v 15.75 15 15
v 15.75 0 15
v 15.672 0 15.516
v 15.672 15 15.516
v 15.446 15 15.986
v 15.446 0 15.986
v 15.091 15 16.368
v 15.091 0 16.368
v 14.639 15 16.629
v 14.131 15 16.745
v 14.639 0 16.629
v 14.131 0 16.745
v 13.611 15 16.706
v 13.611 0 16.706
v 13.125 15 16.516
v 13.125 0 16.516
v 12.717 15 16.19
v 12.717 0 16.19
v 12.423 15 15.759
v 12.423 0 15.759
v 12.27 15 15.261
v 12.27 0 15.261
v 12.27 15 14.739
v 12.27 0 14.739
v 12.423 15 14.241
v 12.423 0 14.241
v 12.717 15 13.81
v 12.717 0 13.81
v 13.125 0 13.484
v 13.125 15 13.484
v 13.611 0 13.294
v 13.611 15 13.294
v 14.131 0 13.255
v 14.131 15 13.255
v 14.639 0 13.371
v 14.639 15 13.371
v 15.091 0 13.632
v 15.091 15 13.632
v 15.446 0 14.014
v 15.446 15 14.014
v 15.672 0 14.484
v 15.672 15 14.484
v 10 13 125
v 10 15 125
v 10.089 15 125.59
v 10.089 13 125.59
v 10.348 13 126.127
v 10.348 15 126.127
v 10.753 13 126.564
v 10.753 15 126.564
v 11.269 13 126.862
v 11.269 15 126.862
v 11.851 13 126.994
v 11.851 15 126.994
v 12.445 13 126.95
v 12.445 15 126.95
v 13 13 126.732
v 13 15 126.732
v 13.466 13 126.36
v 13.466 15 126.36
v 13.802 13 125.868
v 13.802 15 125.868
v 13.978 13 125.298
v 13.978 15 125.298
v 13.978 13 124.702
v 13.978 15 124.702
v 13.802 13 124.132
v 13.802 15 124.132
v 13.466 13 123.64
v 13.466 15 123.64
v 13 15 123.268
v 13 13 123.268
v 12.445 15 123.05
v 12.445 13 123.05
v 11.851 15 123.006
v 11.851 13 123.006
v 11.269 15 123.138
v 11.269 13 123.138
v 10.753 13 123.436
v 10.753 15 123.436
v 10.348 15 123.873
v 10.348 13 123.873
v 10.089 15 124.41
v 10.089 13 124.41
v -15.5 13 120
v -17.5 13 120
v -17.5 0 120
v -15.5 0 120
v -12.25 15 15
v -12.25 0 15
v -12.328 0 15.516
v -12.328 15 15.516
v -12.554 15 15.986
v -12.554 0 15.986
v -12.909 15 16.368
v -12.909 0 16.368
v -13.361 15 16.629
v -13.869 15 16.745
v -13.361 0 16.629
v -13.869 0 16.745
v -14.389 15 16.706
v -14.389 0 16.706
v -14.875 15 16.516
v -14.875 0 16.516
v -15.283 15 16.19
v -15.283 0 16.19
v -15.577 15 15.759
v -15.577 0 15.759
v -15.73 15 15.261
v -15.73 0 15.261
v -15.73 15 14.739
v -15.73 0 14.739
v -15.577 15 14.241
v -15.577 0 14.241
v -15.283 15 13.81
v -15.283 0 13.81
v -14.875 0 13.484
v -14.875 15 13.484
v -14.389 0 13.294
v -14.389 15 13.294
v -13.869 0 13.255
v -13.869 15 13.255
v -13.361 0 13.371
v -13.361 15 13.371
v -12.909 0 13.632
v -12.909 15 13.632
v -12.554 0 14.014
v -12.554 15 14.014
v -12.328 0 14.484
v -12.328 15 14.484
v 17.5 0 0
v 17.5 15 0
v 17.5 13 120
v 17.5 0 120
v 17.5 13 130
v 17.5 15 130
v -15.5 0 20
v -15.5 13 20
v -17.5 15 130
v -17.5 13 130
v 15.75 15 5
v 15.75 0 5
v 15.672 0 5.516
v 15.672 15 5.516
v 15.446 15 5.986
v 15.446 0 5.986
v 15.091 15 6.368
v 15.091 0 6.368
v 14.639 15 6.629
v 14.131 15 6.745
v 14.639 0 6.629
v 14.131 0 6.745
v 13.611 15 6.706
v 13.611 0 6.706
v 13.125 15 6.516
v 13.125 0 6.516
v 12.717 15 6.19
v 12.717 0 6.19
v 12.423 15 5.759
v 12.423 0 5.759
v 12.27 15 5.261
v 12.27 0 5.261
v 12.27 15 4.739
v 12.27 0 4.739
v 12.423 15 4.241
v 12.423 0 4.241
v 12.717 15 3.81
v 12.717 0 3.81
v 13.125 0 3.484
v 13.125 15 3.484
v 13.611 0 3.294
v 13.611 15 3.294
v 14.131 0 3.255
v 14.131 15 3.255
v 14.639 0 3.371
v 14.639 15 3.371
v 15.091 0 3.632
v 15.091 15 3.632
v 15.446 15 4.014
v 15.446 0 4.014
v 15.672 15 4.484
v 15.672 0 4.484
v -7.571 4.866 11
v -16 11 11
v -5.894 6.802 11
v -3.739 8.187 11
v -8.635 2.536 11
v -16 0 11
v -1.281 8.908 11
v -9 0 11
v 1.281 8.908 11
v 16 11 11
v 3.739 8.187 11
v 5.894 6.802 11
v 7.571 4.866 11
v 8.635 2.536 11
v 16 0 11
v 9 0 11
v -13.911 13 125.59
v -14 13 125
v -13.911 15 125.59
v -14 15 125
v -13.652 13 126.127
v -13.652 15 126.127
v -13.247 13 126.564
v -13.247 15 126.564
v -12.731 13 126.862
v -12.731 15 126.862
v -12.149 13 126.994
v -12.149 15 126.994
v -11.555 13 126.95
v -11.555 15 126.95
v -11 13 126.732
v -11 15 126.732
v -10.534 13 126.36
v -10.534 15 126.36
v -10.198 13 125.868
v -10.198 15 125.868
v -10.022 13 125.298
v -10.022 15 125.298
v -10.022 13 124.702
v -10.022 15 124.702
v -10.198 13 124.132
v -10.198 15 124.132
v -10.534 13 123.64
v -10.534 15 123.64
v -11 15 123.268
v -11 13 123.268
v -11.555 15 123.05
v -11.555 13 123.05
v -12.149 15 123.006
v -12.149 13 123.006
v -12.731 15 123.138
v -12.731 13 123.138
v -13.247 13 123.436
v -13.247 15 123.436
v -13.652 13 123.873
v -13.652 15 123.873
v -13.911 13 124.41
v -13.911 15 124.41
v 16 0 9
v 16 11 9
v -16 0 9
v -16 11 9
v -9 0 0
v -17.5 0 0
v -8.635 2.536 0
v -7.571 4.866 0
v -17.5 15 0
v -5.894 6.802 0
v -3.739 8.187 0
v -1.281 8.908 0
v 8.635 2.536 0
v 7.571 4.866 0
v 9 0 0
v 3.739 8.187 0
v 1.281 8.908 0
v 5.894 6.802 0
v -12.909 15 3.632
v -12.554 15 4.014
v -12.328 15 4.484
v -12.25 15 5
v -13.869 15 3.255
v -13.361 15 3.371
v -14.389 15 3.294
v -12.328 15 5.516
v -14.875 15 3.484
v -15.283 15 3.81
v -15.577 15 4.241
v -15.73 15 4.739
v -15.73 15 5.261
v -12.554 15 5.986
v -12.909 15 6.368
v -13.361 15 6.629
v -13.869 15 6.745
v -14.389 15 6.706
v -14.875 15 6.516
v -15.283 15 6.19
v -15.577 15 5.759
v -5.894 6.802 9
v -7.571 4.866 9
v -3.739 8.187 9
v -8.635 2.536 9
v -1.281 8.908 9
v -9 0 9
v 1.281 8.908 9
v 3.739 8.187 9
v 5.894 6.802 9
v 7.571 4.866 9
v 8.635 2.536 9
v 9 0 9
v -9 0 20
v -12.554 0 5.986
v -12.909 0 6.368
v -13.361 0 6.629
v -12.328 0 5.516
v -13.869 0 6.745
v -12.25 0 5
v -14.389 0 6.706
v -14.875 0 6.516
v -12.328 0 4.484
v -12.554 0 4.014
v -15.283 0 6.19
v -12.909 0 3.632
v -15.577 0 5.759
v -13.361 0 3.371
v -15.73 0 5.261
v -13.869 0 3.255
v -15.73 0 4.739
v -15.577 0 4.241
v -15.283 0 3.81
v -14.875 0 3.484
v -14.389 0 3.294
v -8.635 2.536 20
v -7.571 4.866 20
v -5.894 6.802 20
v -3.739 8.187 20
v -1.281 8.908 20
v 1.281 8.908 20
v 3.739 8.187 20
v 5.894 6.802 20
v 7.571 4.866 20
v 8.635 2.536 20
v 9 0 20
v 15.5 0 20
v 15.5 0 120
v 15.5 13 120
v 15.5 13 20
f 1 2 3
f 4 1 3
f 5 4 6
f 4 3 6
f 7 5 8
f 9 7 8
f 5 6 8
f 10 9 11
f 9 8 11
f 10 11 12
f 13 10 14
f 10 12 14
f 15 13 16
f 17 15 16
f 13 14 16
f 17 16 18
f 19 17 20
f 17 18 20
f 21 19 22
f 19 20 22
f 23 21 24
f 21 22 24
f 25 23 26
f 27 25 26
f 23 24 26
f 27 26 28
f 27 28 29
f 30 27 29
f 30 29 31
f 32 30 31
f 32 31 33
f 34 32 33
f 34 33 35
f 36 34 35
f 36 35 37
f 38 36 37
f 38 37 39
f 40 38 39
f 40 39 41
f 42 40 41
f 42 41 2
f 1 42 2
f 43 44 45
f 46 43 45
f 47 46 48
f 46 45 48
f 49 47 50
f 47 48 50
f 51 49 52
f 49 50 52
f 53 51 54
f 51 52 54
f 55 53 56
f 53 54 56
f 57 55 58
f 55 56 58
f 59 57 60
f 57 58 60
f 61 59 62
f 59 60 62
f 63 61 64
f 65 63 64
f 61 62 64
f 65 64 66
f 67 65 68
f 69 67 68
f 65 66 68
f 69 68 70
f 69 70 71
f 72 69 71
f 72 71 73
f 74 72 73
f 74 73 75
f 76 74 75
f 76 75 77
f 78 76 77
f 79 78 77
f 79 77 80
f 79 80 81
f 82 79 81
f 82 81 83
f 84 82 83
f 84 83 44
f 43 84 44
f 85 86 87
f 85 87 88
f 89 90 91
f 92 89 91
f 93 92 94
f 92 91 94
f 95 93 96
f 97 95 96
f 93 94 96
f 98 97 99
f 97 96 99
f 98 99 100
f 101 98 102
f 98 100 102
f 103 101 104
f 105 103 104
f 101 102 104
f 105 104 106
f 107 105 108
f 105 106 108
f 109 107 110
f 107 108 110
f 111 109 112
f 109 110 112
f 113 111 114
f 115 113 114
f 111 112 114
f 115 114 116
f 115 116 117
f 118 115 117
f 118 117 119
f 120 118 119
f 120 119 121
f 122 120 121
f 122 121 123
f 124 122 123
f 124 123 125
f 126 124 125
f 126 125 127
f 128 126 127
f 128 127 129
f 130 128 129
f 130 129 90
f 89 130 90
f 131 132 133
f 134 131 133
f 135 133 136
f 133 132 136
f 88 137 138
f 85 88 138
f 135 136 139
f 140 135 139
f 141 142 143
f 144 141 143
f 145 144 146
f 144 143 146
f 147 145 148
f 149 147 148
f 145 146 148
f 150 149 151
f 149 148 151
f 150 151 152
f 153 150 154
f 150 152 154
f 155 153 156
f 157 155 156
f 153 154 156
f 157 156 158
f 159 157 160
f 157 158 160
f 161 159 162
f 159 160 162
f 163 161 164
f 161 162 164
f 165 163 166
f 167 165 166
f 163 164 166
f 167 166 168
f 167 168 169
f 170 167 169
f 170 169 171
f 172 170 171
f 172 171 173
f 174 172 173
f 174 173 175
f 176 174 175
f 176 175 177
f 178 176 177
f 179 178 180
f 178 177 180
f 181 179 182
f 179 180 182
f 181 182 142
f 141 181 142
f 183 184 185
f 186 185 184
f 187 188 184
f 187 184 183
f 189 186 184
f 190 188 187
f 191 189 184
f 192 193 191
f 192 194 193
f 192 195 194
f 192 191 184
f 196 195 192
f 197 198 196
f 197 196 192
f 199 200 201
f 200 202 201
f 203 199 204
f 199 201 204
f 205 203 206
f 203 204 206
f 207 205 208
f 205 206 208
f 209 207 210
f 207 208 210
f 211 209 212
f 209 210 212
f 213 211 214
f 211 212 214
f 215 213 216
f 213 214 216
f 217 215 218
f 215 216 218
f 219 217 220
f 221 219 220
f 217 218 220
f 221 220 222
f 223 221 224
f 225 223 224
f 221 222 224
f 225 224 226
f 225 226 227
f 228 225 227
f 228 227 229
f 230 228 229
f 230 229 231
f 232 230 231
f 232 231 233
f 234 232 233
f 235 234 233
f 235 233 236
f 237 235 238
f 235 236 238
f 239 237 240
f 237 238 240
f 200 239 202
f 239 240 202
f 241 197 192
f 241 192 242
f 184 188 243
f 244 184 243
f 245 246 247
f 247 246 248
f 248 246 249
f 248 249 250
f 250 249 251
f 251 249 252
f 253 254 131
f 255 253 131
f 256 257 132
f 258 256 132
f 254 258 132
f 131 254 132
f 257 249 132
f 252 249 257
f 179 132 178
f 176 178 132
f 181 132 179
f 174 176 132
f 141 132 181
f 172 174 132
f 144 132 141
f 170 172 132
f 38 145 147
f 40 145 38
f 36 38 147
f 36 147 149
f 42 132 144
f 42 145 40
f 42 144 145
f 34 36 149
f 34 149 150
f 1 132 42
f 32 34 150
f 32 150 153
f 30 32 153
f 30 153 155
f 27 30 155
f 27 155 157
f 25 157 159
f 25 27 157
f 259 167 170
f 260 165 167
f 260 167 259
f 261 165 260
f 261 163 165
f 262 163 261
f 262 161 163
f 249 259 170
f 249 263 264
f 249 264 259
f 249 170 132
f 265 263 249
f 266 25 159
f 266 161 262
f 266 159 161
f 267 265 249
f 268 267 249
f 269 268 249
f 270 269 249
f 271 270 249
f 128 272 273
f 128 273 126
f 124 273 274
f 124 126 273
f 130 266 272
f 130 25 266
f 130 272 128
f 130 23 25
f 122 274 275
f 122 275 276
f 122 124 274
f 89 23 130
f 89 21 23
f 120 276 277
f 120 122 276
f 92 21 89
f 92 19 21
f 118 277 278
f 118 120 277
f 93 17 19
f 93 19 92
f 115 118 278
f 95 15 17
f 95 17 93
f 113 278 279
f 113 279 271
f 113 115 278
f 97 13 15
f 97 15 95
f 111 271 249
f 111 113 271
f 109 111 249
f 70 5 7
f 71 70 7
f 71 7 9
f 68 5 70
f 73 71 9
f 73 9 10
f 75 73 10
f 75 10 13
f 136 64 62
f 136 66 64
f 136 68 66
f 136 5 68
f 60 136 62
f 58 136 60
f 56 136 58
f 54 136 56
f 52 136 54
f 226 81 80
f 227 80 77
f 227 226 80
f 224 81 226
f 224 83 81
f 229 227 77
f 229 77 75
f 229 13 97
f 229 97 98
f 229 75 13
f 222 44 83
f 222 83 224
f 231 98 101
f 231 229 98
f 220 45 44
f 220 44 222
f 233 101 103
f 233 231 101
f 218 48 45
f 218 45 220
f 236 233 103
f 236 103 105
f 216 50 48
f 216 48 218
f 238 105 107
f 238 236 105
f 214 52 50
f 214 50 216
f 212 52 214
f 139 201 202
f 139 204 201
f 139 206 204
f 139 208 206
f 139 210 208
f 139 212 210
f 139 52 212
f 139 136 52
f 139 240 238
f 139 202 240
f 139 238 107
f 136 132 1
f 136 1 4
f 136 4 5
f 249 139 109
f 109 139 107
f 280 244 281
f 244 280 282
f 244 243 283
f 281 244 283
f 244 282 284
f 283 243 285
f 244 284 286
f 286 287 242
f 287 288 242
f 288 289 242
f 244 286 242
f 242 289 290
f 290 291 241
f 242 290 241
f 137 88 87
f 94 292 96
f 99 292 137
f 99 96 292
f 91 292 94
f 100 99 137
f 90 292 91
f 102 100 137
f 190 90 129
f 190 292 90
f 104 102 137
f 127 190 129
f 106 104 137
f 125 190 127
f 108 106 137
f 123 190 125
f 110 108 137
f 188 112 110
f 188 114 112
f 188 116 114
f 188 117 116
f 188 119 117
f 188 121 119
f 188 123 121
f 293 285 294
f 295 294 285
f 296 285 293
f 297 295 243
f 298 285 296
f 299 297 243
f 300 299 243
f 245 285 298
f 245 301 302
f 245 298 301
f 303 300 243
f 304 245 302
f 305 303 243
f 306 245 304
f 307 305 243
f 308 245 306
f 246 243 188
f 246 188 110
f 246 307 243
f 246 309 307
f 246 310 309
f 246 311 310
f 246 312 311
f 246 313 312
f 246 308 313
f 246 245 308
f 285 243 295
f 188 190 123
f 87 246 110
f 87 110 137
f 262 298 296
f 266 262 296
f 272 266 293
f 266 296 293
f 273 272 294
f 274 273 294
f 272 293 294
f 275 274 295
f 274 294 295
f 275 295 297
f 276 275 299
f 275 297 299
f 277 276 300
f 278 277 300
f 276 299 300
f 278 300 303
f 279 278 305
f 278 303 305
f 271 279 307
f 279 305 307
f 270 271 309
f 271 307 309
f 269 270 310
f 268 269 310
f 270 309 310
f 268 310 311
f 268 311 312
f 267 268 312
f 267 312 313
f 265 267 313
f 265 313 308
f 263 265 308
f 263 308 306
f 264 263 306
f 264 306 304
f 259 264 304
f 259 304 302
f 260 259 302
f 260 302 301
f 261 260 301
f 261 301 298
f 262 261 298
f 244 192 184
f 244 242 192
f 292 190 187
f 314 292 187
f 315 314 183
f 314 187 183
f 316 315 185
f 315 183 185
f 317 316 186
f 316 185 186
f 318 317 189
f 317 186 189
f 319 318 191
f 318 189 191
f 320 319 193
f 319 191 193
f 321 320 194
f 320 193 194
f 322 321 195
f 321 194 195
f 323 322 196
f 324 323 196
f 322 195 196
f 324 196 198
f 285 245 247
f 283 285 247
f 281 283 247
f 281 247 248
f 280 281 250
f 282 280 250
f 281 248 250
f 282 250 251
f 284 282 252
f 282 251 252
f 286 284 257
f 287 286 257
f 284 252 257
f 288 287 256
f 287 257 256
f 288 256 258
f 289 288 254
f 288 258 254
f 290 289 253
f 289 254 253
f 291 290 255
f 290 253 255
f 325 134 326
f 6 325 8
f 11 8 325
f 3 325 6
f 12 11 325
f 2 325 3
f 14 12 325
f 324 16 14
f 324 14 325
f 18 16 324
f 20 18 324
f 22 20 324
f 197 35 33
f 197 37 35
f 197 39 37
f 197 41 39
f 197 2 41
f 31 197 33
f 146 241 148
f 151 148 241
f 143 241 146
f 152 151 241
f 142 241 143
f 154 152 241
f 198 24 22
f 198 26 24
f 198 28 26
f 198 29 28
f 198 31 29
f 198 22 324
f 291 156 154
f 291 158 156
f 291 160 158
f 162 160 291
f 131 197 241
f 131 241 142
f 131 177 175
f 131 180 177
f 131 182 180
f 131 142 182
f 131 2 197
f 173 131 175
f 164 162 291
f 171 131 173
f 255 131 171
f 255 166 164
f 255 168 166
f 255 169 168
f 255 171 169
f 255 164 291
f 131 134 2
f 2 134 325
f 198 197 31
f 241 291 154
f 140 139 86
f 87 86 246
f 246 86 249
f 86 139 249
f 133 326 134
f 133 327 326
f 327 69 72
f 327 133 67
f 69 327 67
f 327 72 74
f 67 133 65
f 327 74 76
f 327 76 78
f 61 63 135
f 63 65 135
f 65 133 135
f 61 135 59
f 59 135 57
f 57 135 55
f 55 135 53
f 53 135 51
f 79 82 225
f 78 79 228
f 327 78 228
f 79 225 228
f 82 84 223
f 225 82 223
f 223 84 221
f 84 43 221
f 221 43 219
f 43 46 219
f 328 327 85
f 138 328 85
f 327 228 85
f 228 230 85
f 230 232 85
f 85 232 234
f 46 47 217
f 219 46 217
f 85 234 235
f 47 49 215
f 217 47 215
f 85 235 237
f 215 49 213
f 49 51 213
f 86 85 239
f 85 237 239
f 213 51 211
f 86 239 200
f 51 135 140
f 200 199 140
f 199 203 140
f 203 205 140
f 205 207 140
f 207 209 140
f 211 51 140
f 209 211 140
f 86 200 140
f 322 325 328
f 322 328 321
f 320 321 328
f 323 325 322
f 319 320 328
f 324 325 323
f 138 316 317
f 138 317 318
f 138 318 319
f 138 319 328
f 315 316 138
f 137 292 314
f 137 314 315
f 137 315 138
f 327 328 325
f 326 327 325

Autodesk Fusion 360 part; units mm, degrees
sketch "スケッチ1" plane through (0, 0, 0) normal (0, 0, 1) x (1, 0, 0)
  line L0 (-17.5, 15) -> (17.5, 15)
  line L1 (17.5, 15) -> (17.5, 0)
  line L2 (17.5, 0) -> (-17.5, 0)
  line L3 (-17.5, 0) -> (-17.5, 15)
  dimension "d1" = 35
  dimension "d2" = 15
extrude "押し出し1" add sketch "スケッチ1" along normal blind 120
sketch "スケッチ2" plane through (0, 0, 0) normal (0, 0, -1) x (1, 0, 0)
  line L0 (17.5, 0) -> (-17.5, 0)
  line L1 (-17.5, 0) -> (-17.5, -15)
  line L2 (-17.5, -15) -> (17.5, -15)
  line L3 (17.5, -15) -> (17.5, 0)
  circle A0 centre (0, 0) radius 9
  dimension "d5" = 18
extrude "押し出し2" cut sketch "スケッチ2" against normal blind 20 contours L0 A0 picked at (1.5, -2.5981)
sketch "スケッチ3" plane through (0, 0, 120) normal (0, 0, 1) x (-1, 0, 0)
  line L0 (17.5, 0) -> (-17.5, 0)
  line L1 (-17.5, 0) -> (-17.5, -15)
  line L2 (-17.5, -15) -> (17.5, -15)
  line L3 (17.5, -15) -> (17.5, 0)
  line L4 (15.5, -13) -> (-15.5, -13)
  line L5 (-15.5, -13) -> (-15.5, 0)
  line L6 (-15.5, 0) -> (15.5, 0)
  line L7 (15.5, 0) -> (15.5, -13)
  dimension "d8" = 2
  dimension "d9" = 31
extrude "押し出し3" cut sketch "スケッチ3" against normal blind 100 contours L0 L4 L5 L6 L7
ref_plane "作業平面1" through (0, 7.5, 9) normal (0, 0, -1) x (-1, 0, 0)
sketch "スケッチ4" plane through (0, 6, 9) normal (0, 0, -1) x (1, 0, 0)
  line L0 (-17.5, 6) -> (17.5, 6)
  line L1 (17.5, 6) -> (17.5, -5)
  line L2 (17.5, -5) -> (-17.5, -5)
  line L3 (-17.5, -5) -> (-17.5, 6)
  line L4 (-17.5, 6) -> (-17.5, -9)
  line L5 (17.5, -9) -> (17.5, 6)
  line L6 (17.5, 6) -> (9, 6)
  dimension "d13" = 11
extrude "押し出し4" cut sketch "スケッチ4" against normal blind 2
sketch "スケッチ5" plane through (0, 15, 0) normal (0, 1, 0) x (-1, 0, 0)
  line L0 (-17.5, 0) -> (17.5, 0)
  line L1 (17.5, 0) -> (17.5, 120)
  line L2 (17.5, 120) -> (-17.5, 120)
  line L3 (-17.5, 120) -> (-17.5, 0)
  line L4 (-17.5, 130) -> (17.5, 130)
  line L5 (17.5, 130) -> (17.5, 120)
  line L6 (17.5, 120) -> (-17.5, 120)
  line L7 (-17.5, 120) -> (-17.5, 130)
  line L8 (-17.5, 125) -> (17.5, 125) construction
  circle A0 centre (12, 125) radius 2
  circle A1 centre (-12, 125) radius 2
  dimension "d16" = 4
  dimension "d17" = 4
  dimension "d18" = 24
  dimension "d19" = 10
  dimension "d20" = 5.5
extrude "押し出し5" add sketch "スケッチ5" against normal blind 2 contours L2 L4 L5 L6 L7
sketch "スケッチ7" plane through (0, 0, 0) normal (0, -1, 0) x (1, 0, 0)
  line L0 (-17.5, 11) -> (-9, 11)
  line L1 (-9, 11) -> (-9, 20)
  line L2 (-9, 20) -> (-15.5, 20)
  line L3 (-15.5, 20) -> (-15.5, 120)
  line L4 (-15.5, 120) -> (-17.5, 120)
  line L5 (-17.5, 120) -> (-17.5, 11)
  line L6 (-17.5, 11) -> (-16, 11)
  line L7 (-16, 11) -> (-16, 9)
  line L8 (-16, 9) -> (-17.5, 9)
  line L9 (-17.5, 9) -> (-17.5, 11)
  line L10 (-9, 9) -> (-17.5, 9)
  line L11 (17.5, 11) -> (16, 11)
  line L12 (16, 11) -> (16, 9)
  line L13 (16, 9) -> (17.5, 9)
  line L14 (17.5, 9) -> (17.5, 11)
  line L15 (17.5, 9) -> (9, 9)
  point P0 (17.5, 11)
  dimension "d26" = 32
  dimension "d27" = 1.5
extrude "押し出し7" add sketch "スケッチ7" against normal blind 11 contours L0 L6 L7 L8 L9 L10 | L11 L12 L13 L14 L15
sketch "スケッチ8" plane through (0, 0, 0) normal (0, -1, 0) x (1, 0, 0)
  line L0 (-16, 11) -> (-9, 11)
  line L1 (-9, 11) -> (-9, 20)
  line L2 (-9, 20) -> (-15.5, 20)
  line L3 (-15.5, 20) -> (-15.5, 120)
  line L4 (-15.5, 120) -> (-17.5, 120)
  line L5 (-17.5, 120) -> (-17.5, 0)
  line L6 (-17.5, 0) -> (-9, 0)
  line L7 (-9, 0) -> (-9, 9)
  line L8 (-9, 9) -> (-16, 9)
  line L9 (-16, 9) -> (-16, 11)
  circle A0 centre (-14, 15) radius 1.75
  line L10 (18.5, 15) -> (-17.5, 15) construction
  line L11 (17.541, 5) -> (-17.5, 5) construction
  line L12 (15.5, 20) -> (9, 20) construction
  circle A1 centre (14, 15) radius 1.75
  circle A2 centre (14, 5) radius 1.75
  circle A3 centre (-14, 5) radius 1.75
  line L13 (17.5, 0) -> (17.5, 120)
  dimension "d30" = 5
  dimension "d31" = 10
  dimension "d32" = 3.5
  dimension "d33" = 3.5
  dimension "d34" = 3.5
  dimension "d35" = 3.5
  dimension "d36" = 3.5
  dimension "d37" = 3.5
  dimension "d38" = 3.5
  dimension "d39" = 3.5
extrude "押し出し8" cut sketch "スケッチ8" against normal blind 15 contours A0 | A1 | A2 | A3
